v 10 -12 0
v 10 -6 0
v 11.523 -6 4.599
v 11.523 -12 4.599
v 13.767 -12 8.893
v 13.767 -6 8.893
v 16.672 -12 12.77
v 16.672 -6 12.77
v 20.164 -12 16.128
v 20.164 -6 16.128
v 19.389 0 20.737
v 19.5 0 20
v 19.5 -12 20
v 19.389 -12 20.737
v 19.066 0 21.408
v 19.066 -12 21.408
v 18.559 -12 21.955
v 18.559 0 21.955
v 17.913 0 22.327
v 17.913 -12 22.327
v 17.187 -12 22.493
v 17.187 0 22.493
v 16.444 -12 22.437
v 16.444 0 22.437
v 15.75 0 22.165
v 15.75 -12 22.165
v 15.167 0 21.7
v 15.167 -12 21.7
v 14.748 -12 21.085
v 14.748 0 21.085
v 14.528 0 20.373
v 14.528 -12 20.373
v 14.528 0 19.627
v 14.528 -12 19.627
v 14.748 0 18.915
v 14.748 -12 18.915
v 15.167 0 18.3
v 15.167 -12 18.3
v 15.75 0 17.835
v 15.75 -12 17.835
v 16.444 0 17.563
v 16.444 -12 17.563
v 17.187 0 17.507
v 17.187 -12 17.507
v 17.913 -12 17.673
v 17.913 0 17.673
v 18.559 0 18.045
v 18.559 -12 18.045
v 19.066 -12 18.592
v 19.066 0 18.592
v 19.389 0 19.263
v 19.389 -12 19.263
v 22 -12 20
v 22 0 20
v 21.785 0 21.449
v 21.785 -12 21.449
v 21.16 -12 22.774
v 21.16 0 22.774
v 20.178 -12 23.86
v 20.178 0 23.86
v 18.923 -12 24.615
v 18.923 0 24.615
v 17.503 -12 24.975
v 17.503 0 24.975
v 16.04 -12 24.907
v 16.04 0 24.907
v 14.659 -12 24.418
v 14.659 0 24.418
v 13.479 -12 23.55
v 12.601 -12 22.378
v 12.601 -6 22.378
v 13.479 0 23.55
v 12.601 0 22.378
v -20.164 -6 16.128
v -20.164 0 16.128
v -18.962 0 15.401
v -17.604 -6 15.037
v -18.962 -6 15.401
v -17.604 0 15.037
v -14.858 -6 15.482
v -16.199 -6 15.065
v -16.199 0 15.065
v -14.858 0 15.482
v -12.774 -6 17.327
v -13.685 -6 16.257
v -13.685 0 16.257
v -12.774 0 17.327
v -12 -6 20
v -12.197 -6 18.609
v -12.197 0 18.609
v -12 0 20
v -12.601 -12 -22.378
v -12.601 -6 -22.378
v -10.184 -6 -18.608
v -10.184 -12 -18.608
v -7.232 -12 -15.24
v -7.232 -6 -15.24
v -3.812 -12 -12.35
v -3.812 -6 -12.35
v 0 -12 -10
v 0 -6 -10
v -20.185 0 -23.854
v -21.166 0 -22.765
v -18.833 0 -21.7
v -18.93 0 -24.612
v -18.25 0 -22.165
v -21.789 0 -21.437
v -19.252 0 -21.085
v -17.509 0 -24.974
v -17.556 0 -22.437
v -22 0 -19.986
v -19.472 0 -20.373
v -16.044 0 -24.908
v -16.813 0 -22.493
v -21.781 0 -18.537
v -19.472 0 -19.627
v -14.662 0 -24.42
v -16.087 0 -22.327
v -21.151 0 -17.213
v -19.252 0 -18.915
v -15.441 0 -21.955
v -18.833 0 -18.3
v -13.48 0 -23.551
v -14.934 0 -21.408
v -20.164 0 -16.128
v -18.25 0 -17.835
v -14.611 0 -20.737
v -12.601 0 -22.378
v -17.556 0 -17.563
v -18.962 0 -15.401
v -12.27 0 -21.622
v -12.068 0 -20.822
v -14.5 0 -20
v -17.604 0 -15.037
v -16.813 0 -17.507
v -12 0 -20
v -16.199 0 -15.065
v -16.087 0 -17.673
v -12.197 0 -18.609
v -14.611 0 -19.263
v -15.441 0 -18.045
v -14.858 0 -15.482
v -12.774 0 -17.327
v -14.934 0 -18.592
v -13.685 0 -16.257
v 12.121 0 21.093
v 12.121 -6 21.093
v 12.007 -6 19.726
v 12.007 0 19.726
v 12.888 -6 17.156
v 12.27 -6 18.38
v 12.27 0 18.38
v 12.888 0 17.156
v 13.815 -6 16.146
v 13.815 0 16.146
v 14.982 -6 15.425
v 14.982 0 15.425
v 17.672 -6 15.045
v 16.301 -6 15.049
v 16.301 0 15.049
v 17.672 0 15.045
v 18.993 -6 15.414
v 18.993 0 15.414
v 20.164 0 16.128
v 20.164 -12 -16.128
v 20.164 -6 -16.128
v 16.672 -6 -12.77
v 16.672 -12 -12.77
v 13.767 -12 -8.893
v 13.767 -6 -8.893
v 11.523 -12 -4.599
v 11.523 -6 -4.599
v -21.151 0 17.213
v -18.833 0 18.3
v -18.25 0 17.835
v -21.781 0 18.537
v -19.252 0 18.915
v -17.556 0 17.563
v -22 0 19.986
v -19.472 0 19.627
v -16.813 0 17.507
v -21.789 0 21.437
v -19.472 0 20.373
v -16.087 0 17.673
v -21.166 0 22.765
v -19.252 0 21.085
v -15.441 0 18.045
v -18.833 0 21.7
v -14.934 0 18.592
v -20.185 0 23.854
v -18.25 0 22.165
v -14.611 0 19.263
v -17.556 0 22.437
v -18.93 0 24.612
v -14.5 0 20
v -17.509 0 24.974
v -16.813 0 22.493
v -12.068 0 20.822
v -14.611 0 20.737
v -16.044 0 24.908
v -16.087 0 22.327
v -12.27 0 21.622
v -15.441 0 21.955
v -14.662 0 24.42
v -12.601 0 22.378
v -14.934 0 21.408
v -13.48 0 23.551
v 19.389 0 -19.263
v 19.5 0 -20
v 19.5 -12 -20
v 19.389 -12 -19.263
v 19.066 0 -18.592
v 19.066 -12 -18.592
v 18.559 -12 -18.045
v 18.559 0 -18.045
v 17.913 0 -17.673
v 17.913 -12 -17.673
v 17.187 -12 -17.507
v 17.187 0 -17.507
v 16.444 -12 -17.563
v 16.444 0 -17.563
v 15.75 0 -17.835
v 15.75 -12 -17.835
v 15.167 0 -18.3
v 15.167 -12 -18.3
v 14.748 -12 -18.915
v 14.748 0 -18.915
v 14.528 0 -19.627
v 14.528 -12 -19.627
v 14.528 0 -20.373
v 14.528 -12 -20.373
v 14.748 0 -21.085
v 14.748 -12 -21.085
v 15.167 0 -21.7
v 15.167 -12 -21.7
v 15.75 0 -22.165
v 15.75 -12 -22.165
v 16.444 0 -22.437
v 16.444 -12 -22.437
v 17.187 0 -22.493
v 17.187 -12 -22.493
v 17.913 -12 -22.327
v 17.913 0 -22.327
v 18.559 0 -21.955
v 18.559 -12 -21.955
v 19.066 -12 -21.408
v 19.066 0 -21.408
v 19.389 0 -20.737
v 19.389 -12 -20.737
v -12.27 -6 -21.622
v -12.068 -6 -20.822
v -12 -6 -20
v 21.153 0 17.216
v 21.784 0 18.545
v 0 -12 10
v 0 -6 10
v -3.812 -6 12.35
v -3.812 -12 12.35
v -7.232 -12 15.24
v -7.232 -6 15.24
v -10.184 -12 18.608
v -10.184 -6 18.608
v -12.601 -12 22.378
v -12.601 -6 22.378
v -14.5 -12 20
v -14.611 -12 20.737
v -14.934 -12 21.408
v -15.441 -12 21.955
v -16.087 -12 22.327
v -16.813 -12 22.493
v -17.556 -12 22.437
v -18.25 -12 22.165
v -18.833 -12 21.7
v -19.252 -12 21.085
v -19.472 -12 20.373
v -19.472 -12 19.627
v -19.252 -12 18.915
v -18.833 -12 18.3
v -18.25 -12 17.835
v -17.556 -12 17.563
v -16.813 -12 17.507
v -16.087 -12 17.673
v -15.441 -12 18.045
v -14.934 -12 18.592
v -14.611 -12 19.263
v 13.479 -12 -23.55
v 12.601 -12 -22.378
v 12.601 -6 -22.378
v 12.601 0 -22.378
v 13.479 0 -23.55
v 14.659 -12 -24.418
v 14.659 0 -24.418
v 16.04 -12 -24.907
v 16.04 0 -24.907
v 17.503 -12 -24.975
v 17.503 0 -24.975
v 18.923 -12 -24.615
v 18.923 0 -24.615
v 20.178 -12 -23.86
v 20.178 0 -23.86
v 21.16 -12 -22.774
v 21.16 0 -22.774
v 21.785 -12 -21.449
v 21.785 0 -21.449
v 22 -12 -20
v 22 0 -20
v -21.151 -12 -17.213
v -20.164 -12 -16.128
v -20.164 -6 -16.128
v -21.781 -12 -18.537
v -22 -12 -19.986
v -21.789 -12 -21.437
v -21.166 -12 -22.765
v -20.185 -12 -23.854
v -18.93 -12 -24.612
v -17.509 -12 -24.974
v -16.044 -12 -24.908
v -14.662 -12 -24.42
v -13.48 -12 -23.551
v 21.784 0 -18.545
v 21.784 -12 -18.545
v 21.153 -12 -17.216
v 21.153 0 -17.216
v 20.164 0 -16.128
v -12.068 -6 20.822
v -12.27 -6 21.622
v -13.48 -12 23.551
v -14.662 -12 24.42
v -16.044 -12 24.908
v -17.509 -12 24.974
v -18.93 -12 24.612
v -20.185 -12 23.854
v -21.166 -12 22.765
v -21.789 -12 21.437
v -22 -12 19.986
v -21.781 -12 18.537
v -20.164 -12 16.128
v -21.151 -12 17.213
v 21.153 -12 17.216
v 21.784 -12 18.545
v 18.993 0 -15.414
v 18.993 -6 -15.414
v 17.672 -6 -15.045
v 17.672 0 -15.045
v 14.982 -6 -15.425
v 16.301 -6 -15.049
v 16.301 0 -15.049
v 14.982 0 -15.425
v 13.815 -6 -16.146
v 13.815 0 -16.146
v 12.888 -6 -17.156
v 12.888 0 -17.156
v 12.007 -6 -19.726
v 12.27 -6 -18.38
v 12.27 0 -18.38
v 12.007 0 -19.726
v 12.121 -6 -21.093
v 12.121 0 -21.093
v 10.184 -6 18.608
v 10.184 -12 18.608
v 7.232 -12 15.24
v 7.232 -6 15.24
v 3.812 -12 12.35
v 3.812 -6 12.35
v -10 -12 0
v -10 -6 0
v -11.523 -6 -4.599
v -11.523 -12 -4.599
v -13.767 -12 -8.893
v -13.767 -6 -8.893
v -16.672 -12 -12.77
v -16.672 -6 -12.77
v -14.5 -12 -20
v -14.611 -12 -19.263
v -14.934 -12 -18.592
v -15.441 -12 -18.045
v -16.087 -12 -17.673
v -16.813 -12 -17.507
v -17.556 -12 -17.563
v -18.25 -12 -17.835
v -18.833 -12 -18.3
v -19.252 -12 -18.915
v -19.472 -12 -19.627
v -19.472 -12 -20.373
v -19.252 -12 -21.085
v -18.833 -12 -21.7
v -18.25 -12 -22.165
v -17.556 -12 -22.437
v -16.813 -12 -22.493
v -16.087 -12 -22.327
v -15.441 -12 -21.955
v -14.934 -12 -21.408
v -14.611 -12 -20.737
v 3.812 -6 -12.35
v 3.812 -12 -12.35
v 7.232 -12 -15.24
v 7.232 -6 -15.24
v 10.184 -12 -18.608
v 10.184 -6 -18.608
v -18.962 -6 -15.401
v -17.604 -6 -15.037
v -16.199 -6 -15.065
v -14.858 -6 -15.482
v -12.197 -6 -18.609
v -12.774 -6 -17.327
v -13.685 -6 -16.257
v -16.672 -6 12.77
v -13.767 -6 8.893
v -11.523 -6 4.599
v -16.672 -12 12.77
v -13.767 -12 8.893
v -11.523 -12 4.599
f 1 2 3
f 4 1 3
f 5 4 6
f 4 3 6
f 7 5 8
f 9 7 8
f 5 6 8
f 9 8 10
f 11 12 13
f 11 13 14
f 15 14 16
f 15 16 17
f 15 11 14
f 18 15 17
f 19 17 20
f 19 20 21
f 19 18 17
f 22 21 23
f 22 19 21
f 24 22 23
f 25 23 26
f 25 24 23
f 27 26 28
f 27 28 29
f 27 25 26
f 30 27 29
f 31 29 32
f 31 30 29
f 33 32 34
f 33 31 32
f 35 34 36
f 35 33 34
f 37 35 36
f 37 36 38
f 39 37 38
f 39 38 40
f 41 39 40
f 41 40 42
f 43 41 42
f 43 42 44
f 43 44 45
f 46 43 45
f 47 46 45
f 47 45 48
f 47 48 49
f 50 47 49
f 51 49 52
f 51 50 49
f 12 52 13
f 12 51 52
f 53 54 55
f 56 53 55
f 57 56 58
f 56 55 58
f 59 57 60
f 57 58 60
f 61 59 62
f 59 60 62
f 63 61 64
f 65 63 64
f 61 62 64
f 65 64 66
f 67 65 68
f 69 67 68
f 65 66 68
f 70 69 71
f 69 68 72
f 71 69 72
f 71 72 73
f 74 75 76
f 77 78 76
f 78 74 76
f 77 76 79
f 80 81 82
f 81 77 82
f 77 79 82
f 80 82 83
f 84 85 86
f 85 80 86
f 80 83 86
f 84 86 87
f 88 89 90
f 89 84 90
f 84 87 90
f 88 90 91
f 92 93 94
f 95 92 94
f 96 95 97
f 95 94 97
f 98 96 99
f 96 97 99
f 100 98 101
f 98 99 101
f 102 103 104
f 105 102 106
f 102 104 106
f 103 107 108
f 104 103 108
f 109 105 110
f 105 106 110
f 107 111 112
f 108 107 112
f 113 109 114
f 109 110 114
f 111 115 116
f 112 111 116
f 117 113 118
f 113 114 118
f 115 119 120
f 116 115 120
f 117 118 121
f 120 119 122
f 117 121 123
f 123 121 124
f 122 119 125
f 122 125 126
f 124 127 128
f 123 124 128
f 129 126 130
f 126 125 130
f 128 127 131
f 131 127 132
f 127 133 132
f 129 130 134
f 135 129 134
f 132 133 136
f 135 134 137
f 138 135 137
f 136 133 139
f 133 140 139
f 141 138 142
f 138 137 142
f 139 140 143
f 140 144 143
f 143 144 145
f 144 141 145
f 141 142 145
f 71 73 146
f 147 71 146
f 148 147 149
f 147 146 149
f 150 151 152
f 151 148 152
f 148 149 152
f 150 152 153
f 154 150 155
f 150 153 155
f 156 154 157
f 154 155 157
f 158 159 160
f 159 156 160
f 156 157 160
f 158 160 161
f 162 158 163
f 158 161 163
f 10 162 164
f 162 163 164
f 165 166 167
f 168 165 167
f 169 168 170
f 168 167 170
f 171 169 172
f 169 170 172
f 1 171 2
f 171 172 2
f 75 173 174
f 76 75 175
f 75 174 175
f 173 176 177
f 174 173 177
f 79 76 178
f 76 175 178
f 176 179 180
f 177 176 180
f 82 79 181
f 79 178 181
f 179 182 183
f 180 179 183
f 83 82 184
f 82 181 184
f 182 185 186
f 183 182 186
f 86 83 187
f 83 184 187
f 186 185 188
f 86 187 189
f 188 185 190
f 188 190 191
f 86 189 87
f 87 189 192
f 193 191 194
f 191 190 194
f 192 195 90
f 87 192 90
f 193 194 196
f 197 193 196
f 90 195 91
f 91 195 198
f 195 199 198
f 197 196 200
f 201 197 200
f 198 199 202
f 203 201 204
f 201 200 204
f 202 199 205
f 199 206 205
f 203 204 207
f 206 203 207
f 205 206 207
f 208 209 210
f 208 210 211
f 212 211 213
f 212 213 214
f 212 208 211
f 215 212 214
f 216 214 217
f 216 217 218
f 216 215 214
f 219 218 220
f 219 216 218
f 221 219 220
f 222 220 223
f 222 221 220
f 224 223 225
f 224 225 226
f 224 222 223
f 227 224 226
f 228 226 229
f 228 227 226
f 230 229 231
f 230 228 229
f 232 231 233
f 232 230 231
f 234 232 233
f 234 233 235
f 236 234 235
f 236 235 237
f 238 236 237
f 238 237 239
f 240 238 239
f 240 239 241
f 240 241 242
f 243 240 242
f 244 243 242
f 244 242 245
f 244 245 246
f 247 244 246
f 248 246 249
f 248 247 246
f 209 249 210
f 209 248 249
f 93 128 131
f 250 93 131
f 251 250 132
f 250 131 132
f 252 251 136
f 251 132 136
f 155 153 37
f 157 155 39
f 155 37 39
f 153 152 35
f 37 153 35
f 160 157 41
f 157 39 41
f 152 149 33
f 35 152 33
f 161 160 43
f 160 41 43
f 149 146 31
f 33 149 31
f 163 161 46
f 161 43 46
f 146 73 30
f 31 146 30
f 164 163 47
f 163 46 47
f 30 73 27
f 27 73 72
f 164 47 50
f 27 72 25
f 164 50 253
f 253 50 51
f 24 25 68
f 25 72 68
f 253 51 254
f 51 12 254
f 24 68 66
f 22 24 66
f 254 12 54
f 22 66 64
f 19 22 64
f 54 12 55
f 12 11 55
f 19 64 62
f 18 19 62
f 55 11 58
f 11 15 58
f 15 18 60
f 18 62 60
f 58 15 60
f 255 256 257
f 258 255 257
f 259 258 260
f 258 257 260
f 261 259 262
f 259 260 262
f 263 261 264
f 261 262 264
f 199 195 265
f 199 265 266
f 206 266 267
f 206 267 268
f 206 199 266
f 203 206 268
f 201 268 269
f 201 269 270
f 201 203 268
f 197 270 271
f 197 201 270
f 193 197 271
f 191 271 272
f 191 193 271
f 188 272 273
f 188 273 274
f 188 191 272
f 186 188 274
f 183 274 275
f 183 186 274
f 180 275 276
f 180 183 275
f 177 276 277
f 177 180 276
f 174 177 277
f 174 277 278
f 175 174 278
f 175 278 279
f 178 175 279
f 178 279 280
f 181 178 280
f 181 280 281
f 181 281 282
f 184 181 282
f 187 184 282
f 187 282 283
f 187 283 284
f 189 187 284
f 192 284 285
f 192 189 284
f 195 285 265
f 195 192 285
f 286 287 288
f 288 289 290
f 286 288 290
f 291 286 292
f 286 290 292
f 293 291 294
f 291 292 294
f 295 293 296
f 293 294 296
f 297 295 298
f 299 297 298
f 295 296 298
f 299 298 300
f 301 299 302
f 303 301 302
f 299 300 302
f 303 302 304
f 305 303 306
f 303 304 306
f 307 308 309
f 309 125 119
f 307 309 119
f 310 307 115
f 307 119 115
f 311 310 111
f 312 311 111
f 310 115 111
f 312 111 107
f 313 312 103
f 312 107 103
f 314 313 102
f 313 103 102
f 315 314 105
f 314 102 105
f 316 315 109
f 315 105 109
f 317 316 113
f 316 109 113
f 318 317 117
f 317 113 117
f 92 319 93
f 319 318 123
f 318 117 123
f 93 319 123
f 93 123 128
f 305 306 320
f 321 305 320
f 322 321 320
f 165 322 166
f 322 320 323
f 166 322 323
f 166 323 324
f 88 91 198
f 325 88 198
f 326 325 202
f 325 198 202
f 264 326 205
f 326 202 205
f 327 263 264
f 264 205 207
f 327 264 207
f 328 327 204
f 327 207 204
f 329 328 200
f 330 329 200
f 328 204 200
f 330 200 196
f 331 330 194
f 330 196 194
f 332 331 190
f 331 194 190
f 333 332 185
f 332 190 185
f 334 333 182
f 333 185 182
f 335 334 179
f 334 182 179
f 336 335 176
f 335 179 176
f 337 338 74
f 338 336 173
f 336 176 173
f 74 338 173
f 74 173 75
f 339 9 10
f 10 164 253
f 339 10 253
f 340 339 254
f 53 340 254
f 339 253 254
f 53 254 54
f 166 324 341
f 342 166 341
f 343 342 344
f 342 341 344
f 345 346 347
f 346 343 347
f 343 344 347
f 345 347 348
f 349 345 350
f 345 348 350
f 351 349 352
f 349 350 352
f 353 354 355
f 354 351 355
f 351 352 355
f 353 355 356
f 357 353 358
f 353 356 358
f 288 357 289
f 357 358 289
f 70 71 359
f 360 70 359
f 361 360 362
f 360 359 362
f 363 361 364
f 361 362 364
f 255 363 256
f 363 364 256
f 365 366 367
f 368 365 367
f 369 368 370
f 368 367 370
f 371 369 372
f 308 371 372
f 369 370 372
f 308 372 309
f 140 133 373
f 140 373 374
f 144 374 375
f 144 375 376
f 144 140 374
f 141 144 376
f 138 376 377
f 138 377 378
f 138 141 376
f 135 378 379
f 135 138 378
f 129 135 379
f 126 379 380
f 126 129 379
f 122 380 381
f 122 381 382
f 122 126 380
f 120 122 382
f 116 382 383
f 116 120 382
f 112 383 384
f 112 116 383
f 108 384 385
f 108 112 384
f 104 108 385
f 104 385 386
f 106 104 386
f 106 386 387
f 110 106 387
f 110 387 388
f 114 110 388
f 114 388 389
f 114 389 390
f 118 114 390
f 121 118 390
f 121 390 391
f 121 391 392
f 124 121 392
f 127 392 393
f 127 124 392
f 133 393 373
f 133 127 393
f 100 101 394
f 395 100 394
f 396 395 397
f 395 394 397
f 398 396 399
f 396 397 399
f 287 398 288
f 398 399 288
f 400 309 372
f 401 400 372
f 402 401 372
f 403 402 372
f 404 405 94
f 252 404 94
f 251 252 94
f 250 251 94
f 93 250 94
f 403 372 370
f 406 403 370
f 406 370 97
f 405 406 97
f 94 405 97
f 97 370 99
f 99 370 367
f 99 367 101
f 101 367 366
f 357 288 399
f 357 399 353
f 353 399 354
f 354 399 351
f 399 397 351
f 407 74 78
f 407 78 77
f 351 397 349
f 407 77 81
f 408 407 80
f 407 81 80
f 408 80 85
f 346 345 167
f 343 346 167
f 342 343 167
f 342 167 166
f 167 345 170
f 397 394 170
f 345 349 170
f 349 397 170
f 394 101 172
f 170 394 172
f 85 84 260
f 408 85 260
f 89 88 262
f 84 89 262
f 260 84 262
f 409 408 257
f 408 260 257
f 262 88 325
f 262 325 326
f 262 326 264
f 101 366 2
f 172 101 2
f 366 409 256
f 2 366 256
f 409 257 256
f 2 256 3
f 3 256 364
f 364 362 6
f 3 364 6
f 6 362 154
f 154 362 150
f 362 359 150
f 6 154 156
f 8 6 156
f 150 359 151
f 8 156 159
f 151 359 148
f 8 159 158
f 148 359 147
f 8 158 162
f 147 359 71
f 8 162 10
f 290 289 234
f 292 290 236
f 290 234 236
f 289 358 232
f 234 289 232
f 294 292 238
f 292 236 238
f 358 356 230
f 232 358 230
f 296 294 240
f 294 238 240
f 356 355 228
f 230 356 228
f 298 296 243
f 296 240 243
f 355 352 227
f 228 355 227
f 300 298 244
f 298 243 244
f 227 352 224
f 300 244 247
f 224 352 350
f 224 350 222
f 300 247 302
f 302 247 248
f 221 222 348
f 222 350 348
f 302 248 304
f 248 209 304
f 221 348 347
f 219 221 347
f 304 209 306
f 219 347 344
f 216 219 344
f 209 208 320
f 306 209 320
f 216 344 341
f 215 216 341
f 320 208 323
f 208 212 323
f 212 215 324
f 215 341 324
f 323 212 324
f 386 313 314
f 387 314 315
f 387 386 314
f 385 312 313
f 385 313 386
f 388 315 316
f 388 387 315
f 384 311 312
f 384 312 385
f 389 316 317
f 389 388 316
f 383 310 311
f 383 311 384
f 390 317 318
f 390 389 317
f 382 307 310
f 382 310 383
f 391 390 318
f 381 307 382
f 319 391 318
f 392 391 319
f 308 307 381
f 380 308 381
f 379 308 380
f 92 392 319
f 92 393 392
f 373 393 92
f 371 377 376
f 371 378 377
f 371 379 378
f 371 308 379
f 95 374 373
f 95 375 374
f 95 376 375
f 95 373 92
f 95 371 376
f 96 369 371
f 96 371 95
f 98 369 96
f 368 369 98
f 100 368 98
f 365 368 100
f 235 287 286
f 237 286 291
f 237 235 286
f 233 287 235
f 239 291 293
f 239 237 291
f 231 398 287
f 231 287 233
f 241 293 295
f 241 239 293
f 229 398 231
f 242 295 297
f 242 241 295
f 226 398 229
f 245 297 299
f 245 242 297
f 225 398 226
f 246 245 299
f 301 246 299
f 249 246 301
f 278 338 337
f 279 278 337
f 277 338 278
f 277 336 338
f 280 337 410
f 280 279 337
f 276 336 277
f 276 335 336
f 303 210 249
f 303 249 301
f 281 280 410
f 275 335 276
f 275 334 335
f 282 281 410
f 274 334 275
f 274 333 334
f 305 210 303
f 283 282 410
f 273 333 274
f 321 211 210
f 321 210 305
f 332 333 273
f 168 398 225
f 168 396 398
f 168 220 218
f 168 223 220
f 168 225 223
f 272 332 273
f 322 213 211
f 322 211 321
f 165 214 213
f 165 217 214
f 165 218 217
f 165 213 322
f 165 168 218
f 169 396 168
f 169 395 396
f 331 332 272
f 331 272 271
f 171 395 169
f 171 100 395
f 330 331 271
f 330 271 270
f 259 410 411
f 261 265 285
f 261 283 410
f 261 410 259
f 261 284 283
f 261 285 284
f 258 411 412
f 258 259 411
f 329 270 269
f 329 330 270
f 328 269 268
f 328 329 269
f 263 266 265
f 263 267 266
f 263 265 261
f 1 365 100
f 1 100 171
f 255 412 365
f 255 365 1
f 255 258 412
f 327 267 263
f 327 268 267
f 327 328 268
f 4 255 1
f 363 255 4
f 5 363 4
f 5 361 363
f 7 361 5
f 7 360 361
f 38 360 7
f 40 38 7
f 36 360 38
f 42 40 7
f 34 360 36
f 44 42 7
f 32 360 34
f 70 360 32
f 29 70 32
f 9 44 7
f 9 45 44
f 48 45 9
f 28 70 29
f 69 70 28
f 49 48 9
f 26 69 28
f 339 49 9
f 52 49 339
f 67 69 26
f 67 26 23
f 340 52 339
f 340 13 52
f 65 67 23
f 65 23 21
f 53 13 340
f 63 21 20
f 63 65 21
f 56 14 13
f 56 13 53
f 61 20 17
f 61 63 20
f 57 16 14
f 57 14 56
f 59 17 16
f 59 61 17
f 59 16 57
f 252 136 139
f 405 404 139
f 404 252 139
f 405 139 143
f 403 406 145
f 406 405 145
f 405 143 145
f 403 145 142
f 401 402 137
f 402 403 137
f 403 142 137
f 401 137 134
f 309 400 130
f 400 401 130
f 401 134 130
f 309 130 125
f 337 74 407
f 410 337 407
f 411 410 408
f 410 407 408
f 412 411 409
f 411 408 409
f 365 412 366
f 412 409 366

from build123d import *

# Parameters (mm, degrees)
F0_R     = 2.5
F1_DEPTH = 12
F2_START = 6
F2_DEPTH = 6


# Not quite as in the source:
# - a feature names something its author has since deleted; it is built from what else it names


with BuildPart() as f1:
    # F0 (on Front) → F1 (new body)
    with BuildSketch(Plane.XZ):
        with BuildLine():
            ThreePointArc((-20.1639063661, 16.1283470576), (-14.8575168414, 15.4822831081), (-12, 20))
            ThreePointArc((-12, 20), (-12.1526927453, 21.2262187321), (-12.6014449516, 22.3775435823))
            ThreePointArc((-12.6014449516, 22.3775435823), (-20.1849966473, 23.8543217765), (-20.1639063661, 16.1283470576))
        make_face()
        with Locations((-17, 20)):
            Circle(F0_R, mode=Mode.SUBTRACT)
    extrude(amount=F1_DEPTH)



with BuildPart() as f1b:
    # F0 (on Front) → F1, piece 2 (new body)
    with BuildSketch(Plane.XZ):
        with BuildLine():
            ThreePointArc((22, 20), (18.2262187321, 24.8473072547), (12.6014449516, 22.3775435823))
            ThreePointArc((12.6014449516, 22.3775435823), (13.8150033527, 16.1456782235), (20.1639063661, 16.1283470576))
            ThreePointArc((20.1639063661, 16.1283470576), (21.5177168919, 17.8575168414), (22, 20))
        make_face()
        with Locations((17, 20)):
            Circle(F0_R, mode=Mode.SUBTRACT)
    extrude(amount=F1_DEPTH)


with BuildPart() as f1c:
    # F0 (on Front) → F1, piece 3 (new body)
    with BuildSketch(Plane.XZ):
        with BuildLine():
            ThreePointArc((22, -20), (21.5177168919, -17.8575168414), (20.1639063661, -16.1283470576))
            ThreePointArc((20.1639063661, -16.1283470576), (13.8150033527, -16.1456782235), (12.6014449516, -22.3775435823))
            ThreePointArc((12.6014449516, -22.3775435823), (18.2262187321, -24.8473072547), (22, -20))
        make_face()
        with Locations((17, -20)):
            Circle(F0_R, mode=Mode.SUBTRACT)
    extrude(amount=F1_DEPTH)


with BuildPart() as f1d:
    # F0 (on Front) → F1, piece 4 (new body)
    with BuildSketch(Plane.XZ):
        with BuildLine():
            ThreePointArc((-12, -20), (-14.8575168414, -15.4822831081), (-20.1639063661, -16.1283470576))
            ThreePointArc((-20.1639063661, -16.1283470576), (-20.1849966473, -23.8543217765), (-12.6014449516, -22.3775435823))
            ThreePointArc((-12.6014449516, -22.3775435823), (-12.1526927453, -21.2262187321), (-12, -20))
        make_face()
        with Locations((-17, -20)):
            Circle(F0_R, mode=Mode.SUBTRACT)
    extrude(amount=F1_DEPTH)


with BuildPart() as f1_1:
    add(f1.part)

    add(f1b.part)  # F2 merges F1b

    add(f1c.part)  # F2 merges F1c

    add(f1d.part)  # F2 merges F1d
    # F0 (on Front) → F2 (join)
    with BuildSketch(Plane.XZ.offset(F2_START)):
        with BuildLine():
            ThreePointArc((-12.6014449516, 22.3775435823), (-12.1526927453, 21.2262187321), (-12, 20))
            ThreePointArc((-12, 20), (-14.8575168414, 15.4822831081), (-20.1639063661, 16.1283470576))
            ThreePointArc((-20.1639063661, 16.1283470576), (-13.766762281, 8.8929923243), (-10, 0))
            ThreePointArc((-10, 0), (-7.0710678119, 7.0710678119), (0, 10))
            ThreePointArc((0, 10), (-7.2323271671, 15.2403150028), (-12.6014449516, 22.3775435823))
        make_face()
        with BuildLine():
            ThreePointArc((10, 0), (7.0710678119, 7.0710678119), (0, 10))
            ThreePointArc((0, 10), (-7.0710678119, 7.0710678119), (-10, 0))
            ThreePointArc((-10, 0), (-7.0710678119, -7.0710678119), (0, -10))
            ThreePointArc((0, -10), (7.0710678119, -7.0710678119), (10, 0))
        make_face()
        with BuildLine():
            ThreePointArc((0, -10), (-7.0710678119, -7.0710678119), (-10, 0))
            ThreePointArc((-10, 0), (-13.766762281, -8.8929923243), (-20.1639063661, -16.1283470576))
            ThreePointArc((-20.1639063661, -16.1283470576), (-14.8575168414, -15.4822831081), (-12, -20))
            ThreePointArc((-12, -20), (-12.1526927453, -21.2262187321), (-12.6014449516, -22.3775435823))
            ThreePointArc((-12.6014449516, -22.3775435823), (-7.2323271671, -15.2403150028), (0, -10))
        make_face()
        with BuildLine():
            ThreePointArc((20.1639063661, -16.1283470576), (13.766762281, -8.8929923243), (10, 0))
            ThreePointArc((10, 0), (7.0710678119, -7.0710678119), (0, -10))
            ThreePointArc((0, -10), (7.2323271671, -15.2403150028), (12.6014449516, -22.3775435823))
            ThreePointArc((12.6014449516, -22.3775435823), (13.8150033527, -16.1456782235), (20.1639063661, -16.1283470576))
        make_face()
        with BuildLine():
            ThreePointArc((12.6014449516, 22.3775435823), (7.2323271671, 15.2403150028), (0, 10))
            ThreePointArc((0, 10), (7.0710678119, 7.0710678119), (10, 0))
            ThreePointArc((10, 0), (13.766762281, 8.8929923243), (20.1639063661, 16.1283470576))
            ThreePointArc((20.1639063661, 16.1283470576), (13.8150033527, 16.1456782235), (12.6014449516, 22.3775435823))
        make_face()
    extrude(amount=F2_DEPTH)


solid = f1_1.part
